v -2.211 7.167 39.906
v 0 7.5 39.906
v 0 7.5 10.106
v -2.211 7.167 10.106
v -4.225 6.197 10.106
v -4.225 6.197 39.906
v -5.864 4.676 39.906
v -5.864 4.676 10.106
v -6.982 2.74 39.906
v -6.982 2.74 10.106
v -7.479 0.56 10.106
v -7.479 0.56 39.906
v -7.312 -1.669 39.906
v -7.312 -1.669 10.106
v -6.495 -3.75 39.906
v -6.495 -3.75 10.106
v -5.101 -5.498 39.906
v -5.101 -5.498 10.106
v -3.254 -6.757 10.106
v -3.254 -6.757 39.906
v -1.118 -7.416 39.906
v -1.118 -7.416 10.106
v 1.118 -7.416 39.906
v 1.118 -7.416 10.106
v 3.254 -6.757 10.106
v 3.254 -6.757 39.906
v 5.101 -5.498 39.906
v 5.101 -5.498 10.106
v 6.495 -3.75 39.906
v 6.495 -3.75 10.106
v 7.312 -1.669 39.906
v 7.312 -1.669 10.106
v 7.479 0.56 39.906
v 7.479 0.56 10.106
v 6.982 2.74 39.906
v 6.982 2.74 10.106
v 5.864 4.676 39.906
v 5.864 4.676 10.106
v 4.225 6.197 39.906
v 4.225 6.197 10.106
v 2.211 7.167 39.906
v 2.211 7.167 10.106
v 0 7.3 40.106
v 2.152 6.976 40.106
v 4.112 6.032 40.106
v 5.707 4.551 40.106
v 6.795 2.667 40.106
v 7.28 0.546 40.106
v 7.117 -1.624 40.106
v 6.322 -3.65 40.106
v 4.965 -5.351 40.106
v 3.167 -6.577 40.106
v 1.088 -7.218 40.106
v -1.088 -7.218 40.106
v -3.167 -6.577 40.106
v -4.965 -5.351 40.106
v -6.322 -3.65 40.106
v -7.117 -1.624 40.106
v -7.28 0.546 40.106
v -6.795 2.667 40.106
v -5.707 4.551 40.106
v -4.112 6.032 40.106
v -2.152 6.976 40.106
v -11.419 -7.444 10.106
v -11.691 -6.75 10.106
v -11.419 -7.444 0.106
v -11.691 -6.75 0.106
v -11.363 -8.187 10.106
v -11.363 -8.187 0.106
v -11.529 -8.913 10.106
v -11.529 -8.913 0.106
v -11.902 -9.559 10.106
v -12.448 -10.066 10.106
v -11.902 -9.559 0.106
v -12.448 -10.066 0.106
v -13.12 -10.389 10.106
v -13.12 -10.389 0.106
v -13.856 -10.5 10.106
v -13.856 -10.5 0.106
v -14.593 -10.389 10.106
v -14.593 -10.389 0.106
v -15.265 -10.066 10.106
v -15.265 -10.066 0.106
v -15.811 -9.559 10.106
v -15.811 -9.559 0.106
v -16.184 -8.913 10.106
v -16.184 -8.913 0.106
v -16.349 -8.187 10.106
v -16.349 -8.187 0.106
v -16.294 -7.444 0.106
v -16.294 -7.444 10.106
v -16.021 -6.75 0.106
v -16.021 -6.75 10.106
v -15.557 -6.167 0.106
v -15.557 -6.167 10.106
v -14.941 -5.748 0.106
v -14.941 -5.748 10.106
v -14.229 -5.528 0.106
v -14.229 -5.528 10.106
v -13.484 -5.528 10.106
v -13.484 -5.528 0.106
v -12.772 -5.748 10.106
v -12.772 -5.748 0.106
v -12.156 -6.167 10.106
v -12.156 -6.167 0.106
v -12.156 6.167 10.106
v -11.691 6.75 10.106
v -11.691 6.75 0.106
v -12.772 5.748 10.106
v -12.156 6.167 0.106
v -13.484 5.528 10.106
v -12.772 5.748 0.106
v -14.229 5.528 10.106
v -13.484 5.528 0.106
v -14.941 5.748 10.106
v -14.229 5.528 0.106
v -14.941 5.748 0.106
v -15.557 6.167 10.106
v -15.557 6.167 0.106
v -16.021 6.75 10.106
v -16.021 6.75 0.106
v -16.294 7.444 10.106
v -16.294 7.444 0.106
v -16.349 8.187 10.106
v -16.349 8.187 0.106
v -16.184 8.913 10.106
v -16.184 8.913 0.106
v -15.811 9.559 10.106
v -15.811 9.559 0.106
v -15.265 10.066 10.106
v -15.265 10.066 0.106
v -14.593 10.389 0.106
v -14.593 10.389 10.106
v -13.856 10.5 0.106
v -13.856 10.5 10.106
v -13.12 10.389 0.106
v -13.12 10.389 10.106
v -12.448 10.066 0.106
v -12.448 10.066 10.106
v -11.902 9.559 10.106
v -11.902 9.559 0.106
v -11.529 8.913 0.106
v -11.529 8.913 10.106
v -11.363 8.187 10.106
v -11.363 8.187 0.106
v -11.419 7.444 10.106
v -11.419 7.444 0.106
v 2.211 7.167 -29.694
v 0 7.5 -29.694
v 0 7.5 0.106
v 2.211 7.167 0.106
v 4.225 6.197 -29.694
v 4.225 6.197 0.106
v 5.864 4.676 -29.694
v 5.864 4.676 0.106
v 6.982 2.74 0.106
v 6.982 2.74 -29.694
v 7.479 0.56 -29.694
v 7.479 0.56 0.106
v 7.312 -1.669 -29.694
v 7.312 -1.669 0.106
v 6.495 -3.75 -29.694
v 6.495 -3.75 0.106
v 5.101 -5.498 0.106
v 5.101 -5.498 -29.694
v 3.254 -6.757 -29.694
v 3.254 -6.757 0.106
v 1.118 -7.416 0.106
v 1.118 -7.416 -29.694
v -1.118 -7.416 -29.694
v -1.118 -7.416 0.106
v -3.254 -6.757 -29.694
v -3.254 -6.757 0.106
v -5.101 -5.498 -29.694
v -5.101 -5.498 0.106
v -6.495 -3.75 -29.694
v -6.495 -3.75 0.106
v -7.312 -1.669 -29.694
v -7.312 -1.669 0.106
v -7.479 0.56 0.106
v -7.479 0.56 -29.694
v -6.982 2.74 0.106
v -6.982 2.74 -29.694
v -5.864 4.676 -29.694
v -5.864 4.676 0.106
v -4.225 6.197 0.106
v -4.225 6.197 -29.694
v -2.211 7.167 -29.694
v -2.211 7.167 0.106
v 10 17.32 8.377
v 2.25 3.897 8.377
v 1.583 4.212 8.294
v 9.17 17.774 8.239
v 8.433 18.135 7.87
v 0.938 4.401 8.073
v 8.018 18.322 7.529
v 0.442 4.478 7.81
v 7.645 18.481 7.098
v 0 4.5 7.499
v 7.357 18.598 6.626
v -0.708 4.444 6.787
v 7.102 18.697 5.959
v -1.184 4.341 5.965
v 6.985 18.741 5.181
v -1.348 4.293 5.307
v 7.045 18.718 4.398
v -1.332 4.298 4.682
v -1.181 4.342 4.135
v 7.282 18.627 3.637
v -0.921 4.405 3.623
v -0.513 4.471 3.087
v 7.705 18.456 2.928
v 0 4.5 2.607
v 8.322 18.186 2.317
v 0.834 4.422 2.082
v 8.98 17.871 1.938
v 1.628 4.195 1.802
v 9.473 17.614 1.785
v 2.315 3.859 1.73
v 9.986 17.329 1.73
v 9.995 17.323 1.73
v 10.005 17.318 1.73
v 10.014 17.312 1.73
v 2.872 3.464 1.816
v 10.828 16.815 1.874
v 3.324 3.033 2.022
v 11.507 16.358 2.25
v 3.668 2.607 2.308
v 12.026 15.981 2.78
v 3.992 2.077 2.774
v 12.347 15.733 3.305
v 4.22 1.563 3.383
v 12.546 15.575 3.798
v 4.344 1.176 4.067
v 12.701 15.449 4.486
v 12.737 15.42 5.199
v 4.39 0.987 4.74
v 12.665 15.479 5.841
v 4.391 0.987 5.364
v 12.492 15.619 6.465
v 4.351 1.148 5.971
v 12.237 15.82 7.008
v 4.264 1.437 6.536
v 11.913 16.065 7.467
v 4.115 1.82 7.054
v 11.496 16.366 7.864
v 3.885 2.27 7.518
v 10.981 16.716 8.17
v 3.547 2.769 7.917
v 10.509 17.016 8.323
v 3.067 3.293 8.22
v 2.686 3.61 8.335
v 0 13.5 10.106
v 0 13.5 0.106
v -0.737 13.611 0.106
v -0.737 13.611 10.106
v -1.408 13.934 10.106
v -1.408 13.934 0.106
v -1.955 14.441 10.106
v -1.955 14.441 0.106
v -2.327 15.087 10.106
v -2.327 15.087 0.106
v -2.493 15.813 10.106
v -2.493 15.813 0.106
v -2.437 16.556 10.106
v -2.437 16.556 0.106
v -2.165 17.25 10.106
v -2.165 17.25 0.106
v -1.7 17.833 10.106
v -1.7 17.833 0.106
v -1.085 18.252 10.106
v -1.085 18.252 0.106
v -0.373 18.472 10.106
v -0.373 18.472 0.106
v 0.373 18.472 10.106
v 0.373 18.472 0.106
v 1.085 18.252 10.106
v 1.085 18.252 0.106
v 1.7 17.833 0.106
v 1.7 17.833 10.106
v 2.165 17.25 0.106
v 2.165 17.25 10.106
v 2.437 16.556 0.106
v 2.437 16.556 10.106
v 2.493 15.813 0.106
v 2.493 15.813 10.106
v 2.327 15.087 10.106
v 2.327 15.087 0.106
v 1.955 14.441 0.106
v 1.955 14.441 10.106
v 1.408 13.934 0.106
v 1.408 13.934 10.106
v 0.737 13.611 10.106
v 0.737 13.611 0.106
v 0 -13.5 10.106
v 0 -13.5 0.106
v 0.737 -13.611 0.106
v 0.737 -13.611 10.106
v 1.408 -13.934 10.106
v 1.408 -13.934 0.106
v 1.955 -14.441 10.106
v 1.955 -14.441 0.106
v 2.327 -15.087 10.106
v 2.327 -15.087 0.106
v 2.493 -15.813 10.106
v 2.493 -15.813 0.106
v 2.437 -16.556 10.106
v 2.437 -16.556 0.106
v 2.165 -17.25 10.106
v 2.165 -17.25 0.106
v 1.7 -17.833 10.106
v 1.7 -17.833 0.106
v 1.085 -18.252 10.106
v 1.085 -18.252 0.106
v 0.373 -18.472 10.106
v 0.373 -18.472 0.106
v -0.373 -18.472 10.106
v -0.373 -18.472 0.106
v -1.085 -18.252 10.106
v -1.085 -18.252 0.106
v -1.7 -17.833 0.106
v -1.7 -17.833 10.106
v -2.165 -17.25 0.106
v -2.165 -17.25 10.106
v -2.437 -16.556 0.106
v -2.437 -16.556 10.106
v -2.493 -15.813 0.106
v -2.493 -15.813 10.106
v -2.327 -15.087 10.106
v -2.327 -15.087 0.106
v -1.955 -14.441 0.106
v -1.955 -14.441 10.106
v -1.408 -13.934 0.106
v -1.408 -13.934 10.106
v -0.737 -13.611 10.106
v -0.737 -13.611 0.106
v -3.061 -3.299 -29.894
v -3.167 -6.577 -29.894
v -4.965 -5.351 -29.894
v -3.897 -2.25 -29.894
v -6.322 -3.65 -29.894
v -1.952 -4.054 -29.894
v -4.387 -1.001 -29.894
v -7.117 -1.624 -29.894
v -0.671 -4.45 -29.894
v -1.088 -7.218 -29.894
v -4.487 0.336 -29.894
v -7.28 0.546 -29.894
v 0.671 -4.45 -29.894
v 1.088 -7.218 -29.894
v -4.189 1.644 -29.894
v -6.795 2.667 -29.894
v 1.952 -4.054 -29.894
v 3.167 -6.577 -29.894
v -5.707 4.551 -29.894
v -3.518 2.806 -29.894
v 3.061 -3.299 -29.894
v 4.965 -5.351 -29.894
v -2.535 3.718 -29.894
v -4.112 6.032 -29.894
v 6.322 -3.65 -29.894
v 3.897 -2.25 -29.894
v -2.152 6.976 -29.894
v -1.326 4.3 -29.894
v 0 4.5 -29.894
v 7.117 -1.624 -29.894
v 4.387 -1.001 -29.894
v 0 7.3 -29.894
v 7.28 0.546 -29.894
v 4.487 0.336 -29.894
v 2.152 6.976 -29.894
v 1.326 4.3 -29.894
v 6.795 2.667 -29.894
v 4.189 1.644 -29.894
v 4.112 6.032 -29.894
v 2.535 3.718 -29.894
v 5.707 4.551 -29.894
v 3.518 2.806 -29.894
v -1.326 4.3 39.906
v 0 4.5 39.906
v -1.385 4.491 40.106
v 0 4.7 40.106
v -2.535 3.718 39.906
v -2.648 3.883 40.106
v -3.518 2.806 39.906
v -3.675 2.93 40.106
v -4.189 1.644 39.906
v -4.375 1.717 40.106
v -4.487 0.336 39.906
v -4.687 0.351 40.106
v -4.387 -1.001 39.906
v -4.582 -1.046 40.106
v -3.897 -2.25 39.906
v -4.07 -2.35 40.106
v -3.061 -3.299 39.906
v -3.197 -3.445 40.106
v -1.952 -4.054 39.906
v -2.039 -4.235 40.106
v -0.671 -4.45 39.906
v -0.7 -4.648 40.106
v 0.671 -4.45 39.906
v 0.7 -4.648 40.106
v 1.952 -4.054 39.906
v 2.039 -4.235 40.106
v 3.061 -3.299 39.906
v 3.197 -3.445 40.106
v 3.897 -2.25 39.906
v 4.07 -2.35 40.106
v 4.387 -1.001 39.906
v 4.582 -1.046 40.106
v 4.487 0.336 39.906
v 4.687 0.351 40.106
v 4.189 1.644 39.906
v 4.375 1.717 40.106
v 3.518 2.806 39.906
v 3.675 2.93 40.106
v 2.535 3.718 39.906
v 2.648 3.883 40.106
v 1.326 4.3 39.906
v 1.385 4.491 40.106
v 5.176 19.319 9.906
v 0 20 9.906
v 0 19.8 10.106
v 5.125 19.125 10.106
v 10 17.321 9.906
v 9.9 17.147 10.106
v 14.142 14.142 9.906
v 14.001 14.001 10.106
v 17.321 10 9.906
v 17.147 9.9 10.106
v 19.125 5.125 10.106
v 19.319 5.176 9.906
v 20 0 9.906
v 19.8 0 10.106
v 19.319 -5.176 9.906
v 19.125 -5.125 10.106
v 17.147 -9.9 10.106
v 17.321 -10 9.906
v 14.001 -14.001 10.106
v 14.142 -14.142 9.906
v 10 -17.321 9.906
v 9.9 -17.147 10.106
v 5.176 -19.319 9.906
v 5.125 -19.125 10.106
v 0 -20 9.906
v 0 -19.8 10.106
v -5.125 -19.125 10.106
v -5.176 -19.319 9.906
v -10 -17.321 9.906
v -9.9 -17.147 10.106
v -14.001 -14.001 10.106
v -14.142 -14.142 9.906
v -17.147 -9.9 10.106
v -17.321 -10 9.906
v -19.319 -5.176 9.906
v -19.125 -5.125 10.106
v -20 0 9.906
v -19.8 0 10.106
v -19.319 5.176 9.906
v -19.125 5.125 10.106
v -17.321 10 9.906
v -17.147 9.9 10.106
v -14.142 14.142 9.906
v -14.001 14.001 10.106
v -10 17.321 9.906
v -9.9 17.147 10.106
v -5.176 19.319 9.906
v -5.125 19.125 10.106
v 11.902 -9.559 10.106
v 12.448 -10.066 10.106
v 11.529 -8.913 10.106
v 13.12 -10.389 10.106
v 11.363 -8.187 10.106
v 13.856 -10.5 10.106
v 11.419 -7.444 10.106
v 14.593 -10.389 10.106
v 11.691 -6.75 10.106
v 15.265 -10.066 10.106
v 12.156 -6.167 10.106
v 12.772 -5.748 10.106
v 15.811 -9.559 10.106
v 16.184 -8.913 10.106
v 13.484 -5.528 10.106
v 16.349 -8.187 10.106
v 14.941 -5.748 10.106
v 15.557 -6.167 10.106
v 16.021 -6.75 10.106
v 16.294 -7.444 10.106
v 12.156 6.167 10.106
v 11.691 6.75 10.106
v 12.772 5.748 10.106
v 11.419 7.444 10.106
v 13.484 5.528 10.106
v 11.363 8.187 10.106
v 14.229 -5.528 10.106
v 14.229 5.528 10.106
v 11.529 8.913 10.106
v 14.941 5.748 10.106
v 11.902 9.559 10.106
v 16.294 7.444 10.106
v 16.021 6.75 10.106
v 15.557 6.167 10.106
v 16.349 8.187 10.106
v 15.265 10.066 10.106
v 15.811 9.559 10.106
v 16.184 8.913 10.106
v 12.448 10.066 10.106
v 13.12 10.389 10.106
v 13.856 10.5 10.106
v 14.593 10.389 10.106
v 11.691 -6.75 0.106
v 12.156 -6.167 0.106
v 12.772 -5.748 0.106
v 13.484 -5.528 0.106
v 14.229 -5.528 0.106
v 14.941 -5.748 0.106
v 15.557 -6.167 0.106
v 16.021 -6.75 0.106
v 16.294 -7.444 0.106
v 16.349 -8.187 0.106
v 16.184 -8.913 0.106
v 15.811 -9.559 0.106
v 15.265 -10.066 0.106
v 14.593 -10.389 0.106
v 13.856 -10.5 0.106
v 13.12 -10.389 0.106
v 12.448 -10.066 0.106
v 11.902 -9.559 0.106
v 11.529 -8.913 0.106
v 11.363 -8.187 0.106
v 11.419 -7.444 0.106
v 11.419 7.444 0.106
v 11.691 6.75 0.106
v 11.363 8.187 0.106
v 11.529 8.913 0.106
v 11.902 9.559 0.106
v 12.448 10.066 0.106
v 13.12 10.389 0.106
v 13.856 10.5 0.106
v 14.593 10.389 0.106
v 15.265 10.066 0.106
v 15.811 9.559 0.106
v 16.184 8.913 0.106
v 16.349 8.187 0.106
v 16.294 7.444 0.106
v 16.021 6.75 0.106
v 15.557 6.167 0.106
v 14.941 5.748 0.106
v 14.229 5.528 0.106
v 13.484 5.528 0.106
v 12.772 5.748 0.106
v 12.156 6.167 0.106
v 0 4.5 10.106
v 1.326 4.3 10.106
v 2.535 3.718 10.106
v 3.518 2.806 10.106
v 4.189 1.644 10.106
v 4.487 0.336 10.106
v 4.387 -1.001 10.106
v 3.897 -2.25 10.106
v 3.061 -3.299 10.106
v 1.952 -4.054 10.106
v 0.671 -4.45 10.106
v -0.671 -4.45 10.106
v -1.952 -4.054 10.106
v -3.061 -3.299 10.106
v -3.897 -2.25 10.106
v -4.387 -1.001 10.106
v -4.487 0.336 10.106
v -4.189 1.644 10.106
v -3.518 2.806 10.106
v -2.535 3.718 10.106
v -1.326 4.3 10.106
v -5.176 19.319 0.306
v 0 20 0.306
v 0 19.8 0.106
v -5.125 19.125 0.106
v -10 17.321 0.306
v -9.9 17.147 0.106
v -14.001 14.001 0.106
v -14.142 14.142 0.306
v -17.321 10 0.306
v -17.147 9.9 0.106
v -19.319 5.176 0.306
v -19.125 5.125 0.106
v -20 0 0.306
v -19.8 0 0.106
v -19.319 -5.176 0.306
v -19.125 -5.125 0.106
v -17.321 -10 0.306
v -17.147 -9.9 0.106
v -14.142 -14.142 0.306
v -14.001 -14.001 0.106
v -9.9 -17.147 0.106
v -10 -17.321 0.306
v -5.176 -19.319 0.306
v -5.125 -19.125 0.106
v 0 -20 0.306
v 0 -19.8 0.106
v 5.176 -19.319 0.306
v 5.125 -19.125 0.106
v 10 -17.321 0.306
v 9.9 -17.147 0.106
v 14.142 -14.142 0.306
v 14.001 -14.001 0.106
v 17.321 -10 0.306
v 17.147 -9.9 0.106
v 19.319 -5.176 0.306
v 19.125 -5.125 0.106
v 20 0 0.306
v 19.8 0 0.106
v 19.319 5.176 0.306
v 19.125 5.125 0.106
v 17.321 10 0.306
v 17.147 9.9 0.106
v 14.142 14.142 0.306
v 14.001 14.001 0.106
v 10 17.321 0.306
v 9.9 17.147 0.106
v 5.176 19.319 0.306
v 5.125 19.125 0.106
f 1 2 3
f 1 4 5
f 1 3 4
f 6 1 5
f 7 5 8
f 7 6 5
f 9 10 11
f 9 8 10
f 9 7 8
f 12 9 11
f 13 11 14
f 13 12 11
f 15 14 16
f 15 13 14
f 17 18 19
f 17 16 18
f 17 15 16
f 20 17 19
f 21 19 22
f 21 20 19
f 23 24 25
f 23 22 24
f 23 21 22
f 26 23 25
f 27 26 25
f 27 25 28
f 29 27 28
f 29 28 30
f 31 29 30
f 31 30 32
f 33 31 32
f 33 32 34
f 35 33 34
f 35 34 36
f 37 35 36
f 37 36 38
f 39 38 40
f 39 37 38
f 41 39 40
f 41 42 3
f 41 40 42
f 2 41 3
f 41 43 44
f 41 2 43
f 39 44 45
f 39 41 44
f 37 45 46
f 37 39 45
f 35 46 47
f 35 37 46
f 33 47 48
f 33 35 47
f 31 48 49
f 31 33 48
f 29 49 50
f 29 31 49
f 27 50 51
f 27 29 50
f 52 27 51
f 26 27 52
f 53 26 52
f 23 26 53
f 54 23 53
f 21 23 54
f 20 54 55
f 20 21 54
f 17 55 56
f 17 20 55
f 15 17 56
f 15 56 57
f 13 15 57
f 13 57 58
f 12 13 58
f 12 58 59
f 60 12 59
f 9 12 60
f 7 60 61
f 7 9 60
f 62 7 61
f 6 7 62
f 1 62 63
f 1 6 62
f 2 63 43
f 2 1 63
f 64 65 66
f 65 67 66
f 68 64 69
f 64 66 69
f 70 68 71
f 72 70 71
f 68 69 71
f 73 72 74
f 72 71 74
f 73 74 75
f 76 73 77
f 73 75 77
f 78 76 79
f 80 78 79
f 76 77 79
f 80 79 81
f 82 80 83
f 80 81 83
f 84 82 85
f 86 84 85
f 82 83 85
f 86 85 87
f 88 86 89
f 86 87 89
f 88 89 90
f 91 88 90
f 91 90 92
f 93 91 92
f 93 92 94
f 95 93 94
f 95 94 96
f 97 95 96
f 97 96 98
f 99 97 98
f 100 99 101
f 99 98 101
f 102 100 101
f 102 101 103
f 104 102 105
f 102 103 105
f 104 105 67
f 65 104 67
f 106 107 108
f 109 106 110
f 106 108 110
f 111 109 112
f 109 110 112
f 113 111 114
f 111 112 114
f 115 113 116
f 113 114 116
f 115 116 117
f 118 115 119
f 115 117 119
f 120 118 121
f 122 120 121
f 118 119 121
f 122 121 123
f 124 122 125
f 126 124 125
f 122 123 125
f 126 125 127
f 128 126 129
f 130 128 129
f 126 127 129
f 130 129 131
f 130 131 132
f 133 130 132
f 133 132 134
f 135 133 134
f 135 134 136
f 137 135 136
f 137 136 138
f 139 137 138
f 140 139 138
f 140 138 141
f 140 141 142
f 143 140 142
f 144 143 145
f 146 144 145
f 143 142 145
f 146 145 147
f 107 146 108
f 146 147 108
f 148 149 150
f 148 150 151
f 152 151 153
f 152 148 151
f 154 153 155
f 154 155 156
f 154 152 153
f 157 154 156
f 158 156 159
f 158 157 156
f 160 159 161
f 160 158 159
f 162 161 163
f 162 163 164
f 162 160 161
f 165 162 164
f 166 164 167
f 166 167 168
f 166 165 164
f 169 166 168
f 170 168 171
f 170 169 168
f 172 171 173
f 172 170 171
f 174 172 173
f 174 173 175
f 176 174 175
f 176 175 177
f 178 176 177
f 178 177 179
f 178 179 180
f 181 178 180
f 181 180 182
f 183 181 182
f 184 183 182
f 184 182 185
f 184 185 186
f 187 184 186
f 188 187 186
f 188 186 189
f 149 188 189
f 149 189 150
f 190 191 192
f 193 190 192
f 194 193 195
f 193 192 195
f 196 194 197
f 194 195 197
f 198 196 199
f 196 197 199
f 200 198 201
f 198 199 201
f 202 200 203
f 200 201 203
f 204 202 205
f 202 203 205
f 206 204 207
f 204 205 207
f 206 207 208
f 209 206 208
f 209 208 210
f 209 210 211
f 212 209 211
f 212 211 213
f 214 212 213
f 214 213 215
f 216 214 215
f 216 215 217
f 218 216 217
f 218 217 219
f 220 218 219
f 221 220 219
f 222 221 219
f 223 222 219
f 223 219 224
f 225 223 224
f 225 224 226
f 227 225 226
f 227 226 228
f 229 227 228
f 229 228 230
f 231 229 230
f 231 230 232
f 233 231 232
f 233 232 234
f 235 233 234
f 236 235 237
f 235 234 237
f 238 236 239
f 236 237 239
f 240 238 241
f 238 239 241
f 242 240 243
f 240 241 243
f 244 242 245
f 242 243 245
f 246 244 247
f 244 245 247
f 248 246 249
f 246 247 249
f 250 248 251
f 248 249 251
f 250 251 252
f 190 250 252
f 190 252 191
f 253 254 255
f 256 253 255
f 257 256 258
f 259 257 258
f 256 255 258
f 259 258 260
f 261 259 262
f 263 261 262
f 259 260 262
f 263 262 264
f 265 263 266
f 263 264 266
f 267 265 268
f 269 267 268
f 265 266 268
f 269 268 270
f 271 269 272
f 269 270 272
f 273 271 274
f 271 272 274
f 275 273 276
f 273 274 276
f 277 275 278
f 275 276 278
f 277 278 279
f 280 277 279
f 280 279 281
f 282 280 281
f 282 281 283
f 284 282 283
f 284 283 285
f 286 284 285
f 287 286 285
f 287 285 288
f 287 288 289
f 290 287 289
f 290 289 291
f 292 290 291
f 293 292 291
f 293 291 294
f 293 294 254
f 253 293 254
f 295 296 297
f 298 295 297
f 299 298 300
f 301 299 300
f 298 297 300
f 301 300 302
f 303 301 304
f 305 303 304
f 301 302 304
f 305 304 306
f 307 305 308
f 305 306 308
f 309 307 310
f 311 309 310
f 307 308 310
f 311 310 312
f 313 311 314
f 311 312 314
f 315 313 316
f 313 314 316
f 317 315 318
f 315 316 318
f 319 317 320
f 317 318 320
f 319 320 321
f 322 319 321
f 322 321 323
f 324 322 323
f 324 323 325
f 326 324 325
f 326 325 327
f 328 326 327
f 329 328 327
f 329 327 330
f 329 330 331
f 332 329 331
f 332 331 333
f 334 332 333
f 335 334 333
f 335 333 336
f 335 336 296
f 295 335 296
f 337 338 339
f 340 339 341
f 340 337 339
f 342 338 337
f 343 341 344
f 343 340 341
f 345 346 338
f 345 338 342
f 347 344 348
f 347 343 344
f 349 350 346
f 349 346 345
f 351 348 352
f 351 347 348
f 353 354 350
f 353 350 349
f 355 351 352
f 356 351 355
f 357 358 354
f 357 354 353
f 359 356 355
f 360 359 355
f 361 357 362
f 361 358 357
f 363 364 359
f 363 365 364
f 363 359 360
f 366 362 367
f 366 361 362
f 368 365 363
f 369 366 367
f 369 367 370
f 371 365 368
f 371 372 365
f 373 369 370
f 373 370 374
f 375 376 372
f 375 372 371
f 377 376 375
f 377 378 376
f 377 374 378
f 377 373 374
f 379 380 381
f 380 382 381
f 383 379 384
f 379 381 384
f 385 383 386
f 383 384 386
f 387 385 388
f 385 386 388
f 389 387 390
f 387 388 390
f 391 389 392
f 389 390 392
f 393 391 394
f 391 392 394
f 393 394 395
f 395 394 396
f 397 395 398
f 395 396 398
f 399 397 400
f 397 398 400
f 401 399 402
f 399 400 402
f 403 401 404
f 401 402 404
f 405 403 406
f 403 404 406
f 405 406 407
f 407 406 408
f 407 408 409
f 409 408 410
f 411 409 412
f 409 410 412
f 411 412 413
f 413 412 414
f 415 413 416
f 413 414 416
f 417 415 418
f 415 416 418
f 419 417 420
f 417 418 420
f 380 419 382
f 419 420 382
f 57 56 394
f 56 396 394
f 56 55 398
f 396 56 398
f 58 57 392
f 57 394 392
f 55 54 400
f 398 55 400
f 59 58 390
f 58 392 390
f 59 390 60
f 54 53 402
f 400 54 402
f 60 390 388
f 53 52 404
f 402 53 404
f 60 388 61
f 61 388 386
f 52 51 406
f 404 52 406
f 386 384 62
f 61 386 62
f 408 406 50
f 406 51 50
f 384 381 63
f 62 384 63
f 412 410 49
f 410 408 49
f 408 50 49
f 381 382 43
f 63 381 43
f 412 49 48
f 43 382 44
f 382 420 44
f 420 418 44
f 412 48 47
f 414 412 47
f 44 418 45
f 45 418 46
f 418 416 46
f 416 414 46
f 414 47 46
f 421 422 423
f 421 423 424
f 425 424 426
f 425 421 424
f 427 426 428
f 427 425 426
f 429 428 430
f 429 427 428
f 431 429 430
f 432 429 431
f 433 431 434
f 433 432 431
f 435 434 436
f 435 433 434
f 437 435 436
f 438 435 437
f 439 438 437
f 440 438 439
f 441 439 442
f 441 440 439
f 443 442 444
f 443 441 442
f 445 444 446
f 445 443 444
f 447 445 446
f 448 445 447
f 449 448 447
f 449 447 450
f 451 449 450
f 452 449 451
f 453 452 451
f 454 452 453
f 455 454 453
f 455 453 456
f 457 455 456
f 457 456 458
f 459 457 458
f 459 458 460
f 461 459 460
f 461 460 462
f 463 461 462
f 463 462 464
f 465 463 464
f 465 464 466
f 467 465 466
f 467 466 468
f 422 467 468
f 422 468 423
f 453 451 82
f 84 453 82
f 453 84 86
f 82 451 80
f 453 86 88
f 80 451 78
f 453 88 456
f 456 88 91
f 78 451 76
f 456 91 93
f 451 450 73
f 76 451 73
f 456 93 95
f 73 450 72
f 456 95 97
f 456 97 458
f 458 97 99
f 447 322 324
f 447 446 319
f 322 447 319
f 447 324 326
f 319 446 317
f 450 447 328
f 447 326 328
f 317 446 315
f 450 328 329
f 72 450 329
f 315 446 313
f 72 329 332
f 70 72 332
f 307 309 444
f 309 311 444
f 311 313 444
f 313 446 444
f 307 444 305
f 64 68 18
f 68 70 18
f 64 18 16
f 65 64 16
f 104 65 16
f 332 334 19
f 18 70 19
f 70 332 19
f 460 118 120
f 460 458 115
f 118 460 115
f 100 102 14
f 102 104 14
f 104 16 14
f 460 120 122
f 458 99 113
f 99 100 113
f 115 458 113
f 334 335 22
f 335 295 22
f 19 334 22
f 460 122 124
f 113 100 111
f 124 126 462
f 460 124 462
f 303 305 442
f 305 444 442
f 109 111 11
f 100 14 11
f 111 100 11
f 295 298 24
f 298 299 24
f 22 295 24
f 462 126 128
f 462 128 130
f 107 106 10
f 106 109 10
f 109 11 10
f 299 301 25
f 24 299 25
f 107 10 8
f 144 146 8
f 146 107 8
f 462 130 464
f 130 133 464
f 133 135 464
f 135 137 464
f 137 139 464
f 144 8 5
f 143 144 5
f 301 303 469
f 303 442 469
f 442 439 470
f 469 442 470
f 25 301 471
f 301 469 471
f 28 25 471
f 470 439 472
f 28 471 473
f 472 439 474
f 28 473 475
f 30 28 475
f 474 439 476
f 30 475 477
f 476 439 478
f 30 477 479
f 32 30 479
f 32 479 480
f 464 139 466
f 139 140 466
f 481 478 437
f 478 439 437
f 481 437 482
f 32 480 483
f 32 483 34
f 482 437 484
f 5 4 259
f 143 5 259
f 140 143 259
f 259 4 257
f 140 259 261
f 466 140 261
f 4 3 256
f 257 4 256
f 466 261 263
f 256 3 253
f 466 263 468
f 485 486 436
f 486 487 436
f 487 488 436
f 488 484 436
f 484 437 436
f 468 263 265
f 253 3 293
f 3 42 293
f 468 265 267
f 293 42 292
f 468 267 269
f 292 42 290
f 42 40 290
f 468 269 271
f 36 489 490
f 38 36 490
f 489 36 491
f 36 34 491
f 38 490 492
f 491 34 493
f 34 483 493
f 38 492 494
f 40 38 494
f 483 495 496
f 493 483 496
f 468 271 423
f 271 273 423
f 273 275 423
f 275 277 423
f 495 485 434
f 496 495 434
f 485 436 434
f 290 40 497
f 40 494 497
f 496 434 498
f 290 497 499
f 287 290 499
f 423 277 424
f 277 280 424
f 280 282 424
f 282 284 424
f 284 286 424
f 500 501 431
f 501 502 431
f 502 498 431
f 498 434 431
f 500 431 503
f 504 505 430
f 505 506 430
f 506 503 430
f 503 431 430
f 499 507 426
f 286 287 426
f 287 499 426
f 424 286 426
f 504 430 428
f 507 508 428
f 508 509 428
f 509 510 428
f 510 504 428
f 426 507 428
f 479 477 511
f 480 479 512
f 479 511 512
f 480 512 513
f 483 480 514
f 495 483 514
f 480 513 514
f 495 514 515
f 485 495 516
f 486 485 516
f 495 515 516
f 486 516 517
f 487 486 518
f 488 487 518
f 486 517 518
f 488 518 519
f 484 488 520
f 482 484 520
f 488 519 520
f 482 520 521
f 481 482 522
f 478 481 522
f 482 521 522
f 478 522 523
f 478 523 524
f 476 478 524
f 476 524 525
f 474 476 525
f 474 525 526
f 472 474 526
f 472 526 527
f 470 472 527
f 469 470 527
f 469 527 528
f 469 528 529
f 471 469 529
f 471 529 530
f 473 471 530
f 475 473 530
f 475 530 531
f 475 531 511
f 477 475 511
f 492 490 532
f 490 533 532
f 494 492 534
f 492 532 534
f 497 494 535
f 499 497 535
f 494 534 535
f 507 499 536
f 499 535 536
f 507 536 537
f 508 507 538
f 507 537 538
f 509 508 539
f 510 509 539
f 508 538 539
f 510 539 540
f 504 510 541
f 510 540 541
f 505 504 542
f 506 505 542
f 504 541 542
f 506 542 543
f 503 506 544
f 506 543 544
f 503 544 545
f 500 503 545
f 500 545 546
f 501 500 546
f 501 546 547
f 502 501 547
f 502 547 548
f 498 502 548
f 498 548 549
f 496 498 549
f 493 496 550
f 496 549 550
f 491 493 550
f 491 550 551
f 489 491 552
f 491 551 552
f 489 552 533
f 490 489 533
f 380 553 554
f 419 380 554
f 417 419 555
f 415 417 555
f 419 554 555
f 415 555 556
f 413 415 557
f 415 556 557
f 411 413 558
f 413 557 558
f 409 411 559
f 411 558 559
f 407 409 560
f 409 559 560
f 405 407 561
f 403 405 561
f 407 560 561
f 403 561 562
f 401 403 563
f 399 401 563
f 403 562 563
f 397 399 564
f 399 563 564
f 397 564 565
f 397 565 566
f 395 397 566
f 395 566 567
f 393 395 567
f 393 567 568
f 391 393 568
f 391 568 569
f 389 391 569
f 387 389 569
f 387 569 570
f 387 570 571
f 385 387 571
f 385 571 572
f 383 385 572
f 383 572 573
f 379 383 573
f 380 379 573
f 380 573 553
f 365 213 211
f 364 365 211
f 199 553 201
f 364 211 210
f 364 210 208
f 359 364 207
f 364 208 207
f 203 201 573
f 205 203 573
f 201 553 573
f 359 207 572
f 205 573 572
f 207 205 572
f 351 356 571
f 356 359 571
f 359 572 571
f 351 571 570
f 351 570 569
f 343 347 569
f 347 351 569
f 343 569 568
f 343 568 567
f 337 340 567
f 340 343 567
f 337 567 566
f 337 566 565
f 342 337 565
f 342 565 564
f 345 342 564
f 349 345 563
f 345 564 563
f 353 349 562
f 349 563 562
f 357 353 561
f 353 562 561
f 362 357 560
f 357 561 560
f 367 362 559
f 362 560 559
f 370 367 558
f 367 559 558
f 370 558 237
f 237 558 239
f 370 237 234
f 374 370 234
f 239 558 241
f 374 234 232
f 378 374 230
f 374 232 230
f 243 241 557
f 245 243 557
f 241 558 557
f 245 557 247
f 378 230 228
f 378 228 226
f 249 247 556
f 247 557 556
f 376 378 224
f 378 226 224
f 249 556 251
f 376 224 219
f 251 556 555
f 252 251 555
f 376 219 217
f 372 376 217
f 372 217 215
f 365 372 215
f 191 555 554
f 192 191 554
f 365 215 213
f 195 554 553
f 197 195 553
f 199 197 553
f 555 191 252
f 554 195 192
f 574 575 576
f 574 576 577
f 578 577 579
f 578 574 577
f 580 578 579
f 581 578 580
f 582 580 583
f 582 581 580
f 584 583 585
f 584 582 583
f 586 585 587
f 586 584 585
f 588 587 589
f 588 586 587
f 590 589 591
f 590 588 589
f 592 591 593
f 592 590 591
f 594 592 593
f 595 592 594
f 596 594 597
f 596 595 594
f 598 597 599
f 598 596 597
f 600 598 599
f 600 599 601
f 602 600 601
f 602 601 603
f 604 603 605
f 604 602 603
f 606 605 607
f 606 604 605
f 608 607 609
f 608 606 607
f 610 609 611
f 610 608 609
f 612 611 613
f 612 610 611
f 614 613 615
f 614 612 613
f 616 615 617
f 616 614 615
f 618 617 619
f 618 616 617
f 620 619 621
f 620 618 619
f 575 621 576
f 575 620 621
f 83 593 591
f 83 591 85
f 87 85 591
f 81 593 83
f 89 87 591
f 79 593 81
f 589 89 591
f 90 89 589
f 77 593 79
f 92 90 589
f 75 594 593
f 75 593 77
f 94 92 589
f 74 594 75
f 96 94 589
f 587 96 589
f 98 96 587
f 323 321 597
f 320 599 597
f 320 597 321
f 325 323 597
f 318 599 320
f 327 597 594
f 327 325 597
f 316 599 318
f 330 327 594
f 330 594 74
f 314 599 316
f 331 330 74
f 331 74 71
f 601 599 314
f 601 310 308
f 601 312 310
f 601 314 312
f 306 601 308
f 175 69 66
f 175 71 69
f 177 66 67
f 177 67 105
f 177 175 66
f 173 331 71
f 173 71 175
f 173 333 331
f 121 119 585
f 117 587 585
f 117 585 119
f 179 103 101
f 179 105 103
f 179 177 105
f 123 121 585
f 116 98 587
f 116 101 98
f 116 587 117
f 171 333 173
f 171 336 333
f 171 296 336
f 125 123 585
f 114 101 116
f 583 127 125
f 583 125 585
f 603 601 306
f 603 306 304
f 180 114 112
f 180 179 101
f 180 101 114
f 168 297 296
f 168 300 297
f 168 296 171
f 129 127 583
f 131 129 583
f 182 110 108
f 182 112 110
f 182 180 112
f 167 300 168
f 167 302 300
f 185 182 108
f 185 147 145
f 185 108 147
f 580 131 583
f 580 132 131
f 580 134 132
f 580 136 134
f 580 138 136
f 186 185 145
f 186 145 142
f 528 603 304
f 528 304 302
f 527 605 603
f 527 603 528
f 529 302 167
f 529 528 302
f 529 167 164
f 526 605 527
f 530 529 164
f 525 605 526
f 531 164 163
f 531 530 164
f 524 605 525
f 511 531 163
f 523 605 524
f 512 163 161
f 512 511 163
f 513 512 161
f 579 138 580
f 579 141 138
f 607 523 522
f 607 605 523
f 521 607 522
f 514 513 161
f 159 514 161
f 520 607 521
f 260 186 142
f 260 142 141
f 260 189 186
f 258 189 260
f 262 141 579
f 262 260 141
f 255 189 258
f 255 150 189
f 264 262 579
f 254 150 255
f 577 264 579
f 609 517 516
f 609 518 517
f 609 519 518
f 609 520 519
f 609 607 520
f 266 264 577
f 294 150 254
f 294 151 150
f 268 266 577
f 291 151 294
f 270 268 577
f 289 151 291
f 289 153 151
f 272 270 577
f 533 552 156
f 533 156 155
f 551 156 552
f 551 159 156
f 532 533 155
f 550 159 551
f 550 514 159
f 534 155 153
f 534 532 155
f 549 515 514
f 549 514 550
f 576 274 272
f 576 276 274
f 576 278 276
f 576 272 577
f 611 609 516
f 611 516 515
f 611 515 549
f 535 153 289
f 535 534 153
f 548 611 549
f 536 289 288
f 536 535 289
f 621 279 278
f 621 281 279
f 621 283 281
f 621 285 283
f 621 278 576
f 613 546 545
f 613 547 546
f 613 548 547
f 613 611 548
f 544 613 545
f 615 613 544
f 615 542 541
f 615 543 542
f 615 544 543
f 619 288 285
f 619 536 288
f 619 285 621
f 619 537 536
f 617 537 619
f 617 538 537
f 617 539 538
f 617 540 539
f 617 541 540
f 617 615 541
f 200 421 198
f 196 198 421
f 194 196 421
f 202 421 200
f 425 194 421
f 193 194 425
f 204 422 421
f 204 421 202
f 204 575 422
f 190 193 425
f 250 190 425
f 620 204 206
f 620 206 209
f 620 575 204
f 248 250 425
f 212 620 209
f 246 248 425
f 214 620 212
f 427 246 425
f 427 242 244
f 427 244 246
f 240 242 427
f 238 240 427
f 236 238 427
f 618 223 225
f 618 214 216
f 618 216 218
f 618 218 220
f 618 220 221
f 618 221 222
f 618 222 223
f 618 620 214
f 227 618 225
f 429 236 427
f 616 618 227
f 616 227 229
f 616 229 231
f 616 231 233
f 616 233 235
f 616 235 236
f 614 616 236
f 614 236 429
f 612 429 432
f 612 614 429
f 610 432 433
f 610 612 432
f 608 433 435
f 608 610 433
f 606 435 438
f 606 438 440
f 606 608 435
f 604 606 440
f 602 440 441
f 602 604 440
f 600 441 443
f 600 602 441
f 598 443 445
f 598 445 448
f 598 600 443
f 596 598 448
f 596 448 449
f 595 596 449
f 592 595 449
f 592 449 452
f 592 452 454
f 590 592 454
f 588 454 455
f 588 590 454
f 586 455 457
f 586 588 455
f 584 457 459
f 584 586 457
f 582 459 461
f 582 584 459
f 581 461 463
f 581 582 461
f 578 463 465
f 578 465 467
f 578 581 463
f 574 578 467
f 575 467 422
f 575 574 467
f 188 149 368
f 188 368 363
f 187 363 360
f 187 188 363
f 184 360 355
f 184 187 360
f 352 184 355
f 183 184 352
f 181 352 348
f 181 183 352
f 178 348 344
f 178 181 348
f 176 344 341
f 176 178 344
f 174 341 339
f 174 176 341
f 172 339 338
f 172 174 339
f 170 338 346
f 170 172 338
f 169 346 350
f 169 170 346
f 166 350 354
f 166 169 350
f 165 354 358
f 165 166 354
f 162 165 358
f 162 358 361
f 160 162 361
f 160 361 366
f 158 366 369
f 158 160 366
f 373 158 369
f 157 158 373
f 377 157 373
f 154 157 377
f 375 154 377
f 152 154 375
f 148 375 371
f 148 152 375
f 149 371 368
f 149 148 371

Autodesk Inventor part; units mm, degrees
ref_plane "XZ Plane" through (0, 0, 0) normal (0, 1, 0) x (-1, 0, 0)
ref_plane "XY Plane" through (0, 0, 0) normal (0, 0, 1) x (1, 0, 0)
sketch "Sketch1" plane through (0, 0, 0) normal (1, 0, 0) x (0, 1, 0)
  line L0 (0, 0) -> (0, -33.1818)
  line L1 (4.5, 10.1062) -> (20, 10.1062)
  line L2 (20, 10.1062) -> (20, 0.1062)
  line L3 (20, 0.1062) -> (7.5, 0.1062)
  line L4 (7.5, 0.1062) -> (7.5, -29.8938)
  line L5 (7.5, -29.8938) -> (4.5, -29.8938)
  line L6 (4.5, -29.8938) -> (4.5, 10.1062)
  line L7 (7.5, 10.1062) -> (7.5, 40.1062)
  line L8 (7.5, 40.1062) -> (4.5, 40.1062)
  line L9 (4.5, 40.1062) -> (4.5, 10.1062)
  dimension "d0" = 9
  dimension "d1" = 15
  dimension "d2" = 30
  dimension "d3" = 10
  dimension "d4" = 40
  dimension "d28" = 30
revolve "Revolution1" add sketch "Sketch1" angle 360 about axis through (0, 0, 0) along (0, 0, -1)
sketch "Sketch2" plane through (0, 0, 10.1062) normal (0, 0, 1) x (1, 0, 0)
  point P0 (0, 0)
  point P1 (0, 16)
  dimension "d6" = 16
hole "Hole1" at (0, 16, 10.1062) direction (0, 0, -1) diameter 5 end through all
pattern_circular "Circular Pattern1" count 6 over 360 about axis through (0, 0, 5.1062) along (0, 0, -1) of "Hole1"
ref_plane "Work Plane2" through (10, 17.3205, 5.1062) normal (0.5, 0.866, 0) x (-0.866, 0.5, 0)
ref_plane "Work Plane1" through (0, 0, 0) normal (0.5, 0.866, 0) x (0, 0, 1)
sketch "Sketch3" plane through (10, 17.3205, 5.1062) normal (0.5, 0.866, 0) x (-0.866, 0.5, 0)
  line L0 (-20, 5) -> (20, 5) projected
  line L1 (-20, -5) -> (20, -5) projected
  line L2 (0, 5) -> (0, -5.1062)
  point P0 (0, -0.0531)
hole "Hole2" at (10, 17.3205, 5.0531) direction (-0.5, -0.866, 0) diameter 6.647 depth 20.2 tip angle 118 thread size "M8x1.25" class "6H" standard "ANSI Metric M Profile"
chamfer "Chamfer1" distance 0.2 angle 45 5 edges at (0, -20, 0.1062) (0, -20, 10.1062) (0, -7.5, -29.8938) (0, -7.5, 40.1062) (0, -4.5, 40.1062)
equation "\"d28\" = d2"
properties part number "Anode" material "Copper"
